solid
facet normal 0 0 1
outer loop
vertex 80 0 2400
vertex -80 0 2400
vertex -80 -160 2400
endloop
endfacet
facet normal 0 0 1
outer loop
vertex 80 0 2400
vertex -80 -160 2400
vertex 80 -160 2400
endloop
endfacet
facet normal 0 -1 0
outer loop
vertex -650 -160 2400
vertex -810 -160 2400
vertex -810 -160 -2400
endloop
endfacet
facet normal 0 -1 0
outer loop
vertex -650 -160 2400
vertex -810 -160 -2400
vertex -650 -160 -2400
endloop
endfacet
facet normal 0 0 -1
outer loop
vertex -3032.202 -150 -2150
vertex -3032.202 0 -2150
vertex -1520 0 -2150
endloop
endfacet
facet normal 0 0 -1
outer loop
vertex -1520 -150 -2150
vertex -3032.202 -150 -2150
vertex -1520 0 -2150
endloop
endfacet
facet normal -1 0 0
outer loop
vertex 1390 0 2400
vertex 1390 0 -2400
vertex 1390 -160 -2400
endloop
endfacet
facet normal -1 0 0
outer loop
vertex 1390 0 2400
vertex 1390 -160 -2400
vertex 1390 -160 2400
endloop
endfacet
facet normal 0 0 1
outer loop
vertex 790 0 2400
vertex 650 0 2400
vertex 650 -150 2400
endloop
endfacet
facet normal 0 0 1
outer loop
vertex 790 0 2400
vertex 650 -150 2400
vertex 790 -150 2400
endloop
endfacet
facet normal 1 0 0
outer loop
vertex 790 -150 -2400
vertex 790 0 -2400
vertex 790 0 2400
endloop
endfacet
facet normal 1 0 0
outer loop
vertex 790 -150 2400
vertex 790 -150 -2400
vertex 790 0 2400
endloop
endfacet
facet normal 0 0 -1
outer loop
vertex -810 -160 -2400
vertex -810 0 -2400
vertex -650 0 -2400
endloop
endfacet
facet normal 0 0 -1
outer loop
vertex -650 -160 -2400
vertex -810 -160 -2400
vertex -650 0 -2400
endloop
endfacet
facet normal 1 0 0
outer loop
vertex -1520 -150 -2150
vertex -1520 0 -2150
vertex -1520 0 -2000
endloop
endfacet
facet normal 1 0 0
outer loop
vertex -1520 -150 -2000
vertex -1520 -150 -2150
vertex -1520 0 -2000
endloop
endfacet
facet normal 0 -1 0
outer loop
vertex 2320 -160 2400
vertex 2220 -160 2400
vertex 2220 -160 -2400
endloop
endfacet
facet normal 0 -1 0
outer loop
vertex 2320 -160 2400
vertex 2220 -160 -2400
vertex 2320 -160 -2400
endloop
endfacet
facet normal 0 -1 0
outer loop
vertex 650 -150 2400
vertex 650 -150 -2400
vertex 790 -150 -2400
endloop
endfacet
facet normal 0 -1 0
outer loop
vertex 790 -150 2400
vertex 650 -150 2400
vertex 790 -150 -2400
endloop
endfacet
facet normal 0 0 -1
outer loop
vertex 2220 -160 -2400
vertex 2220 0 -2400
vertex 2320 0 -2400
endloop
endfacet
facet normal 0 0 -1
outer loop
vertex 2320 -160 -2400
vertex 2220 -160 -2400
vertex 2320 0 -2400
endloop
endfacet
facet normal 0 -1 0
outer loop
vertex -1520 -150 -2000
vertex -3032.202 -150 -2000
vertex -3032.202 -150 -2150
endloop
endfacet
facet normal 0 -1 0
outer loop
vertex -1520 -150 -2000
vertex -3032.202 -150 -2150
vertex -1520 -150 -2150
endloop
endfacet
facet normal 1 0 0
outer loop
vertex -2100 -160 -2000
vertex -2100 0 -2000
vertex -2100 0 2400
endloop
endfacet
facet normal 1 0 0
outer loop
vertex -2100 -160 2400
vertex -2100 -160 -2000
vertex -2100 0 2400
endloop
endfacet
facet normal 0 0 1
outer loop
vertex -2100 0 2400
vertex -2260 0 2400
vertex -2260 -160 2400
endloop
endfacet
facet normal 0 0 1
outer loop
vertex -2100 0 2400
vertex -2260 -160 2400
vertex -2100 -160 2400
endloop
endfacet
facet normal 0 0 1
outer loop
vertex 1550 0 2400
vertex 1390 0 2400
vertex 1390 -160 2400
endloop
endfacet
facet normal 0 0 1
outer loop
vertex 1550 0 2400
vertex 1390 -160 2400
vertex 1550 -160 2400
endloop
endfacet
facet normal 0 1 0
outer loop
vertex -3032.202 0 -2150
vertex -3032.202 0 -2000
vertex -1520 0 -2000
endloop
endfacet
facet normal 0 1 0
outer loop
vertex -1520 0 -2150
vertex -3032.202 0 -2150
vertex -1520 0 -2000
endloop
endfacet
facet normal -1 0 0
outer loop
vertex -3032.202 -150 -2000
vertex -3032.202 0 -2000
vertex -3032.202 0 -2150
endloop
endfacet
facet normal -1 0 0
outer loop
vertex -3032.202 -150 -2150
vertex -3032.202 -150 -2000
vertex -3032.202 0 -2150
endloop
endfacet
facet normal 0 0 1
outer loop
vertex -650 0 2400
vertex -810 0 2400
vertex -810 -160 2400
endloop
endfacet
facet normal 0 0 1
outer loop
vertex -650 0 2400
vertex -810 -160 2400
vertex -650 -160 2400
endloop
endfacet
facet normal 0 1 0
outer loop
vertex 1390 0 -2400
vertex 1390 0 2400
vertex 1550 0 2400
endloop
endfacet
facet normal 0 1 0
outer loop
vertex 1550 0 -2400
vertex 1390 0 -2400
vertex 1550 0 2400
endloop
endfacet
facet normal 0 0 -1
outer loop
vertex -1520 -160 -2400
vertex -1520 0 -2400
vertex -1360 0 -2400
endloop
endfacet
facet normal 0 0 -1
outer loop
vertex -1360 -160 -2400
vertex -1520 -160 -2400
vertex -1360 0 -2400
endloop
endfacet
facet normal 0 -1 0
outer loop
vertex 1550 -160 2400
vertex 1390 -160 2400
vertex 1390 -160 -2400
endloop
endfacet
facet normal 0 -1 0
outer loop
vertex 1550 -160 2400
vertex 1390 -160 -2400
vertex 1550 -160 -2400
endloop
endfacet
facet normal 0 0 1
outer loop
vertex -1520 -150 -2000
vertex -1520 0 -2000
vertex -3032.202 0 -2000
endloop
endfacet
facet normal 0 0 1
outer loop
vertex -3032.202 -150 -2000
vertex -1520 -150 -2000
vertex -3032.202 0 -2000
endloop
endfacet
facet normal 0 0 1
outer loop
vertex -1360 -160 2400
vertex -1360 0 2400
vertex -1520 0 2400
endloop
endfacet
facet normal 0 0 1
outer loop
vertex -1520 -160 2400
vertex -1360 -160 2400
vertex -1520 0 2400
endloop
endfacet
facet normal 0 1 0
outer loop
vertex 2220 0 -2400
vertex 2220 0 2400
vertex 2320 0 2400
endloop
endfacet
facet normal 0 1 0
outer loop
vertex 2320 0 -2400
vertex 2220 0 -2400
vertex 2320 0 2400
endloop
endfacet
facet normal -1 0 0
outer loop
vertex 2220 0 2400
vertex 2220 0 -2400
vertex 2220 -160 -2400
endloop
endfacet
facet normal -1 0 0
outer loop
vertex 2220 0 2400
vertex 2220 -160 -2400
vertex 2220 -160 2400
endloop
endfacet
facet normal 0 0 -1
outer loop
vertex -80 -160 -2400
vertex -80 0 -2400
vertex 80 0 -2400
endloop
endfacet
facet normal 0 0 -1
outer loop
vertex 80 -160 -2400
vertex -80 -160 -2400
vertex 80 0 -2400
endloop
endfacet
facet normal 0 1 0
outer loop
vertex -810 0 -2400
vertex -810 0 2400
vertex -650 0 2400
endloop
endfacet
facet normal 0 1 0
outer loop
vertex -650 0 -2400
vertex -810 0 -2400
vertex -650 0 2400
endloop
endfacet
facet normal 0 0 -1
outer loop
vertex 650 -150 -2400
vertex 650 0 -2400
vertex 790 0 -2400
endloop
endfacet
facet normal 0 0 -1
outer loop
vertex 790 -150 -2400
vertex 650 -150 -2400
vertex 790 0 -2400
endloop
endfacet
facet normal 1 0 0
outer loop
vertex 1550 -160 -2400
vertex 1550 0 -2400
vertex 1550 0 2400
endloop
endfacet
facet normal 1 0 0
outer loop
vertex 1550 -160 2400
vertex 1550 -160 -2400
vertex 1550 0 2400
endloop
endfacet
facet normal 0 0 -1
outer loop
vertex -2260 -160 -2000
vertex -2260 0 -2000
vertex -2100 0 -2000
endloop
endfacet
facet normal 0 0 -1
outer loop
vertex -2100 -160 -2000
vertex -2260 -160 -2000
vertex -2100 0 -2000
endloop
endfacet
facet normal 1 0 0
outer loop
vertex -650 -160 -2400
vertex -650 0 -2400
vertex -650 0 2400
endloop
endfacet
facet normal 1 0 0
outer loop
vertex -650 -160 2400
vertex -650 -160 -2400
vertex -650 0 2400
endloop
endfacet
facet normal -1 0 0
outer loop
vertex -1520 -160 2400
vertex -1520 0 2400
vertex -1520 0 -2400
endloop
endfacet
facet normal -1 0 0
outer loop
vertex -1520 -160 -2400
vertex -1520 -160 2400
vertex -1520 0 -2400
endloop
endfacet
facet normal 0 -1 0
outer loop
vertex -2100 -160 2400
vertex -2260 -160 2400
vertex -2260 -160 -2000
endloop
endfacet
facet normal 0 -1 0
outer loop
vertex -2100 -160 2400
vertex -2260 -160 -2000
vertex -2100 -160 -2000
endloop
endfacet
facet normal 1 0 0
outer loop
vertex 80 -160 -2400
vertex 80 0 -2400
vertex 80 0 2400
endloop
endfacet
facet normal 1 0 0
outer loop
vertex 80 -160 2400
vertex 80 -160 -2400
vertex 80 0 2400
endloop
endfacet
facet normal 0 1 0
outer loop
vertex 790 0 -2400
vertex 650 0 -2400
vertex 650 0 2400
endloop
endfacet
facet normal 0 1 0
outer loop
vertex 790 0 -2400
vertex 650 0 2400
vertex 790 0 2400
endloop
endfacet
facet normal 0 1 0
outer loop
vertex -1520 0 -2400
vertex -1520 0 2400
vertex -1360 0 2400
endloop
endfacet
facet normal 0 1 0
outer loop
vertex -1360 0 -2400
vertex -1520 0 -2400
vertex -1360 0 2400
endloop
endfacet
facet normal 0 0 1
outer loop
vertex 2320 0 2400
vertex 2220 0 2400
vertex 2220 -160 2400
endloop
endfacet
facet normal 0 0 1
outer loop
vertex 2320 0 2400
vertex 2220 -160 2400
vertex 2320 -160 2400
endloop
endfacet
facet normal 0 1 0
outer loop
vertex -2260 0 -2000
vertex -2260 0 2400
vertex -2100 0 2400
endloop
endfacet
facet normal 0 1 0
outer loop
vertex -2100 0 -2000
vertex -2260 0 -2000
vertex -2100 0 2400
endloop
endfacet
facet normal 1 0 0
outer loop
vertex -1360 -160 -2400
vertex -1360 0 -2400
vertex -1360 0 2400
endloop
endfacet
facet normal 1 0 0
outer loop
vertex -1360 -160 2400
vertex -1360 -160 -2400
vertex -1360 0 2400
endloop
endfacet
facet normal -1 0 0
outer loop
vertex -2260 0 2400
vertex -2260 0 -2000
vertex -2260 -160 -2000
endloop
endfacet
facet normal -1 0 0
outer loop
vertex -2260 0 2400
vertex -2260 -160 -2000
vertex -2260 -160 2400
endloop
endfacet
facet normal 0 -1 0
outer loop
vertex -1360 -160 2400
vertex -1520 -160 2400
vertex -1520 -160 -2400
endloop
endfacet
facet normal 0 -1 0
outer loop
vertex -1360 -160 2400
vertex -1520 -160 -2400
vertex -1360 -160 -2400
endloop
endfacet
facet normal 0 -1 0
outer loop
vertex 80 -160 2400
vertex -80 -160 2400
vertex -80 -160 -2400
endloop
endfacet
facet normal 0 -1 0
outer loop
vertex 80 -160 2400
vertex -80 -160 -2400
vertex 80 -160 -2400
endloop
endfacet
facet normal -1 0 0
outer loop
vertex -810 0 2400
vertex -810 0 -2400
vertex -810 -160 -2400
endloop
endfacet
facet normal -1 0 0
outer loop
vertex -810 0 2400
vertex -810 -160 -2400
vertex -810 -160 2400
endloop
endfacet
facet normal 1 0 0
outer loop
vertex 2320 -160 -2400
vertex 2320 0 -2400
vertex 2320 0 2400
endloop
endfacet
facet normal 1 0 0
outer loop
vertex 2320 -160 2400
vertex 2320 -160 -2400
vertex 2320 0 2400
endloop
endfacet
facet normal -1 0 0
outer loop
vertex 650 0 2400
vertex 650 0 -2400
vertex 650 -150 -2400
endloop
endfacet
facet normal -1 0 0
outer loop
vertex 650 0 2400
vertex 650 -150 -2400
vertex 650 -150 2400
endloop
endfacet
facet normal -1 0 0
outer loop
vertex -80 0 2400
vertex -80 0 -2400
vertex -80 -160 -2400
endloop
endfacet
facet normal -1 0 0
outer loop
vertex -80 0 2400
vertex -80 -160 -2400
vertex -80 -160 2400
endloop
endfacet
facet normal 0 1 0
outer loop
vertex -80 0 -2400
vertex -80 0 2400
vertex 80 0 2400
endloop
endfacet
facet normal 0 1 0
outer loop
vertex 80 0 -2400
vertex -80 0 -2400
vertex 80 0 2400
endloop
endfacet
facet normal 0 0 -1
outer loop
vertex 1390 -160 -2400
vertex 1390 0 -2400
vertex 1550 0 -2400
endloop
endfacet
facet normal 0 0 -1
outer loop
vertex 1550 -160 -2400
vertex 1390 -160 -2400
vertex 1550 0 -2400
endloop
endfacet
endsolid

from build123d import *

# Parameters (mm, degrees)
F0_W     = 100
F0_H     = 4800
F0_W_2   = 160
F0_H_2   = 4400
F1_DEPTH = 160
F0_W_3   = 140
F2_DEPTH = 150


with BuildPart() as f1:
    # F0 (on Front) → F1 (new body)
    with BuildSketch(Plane.XZ):
        with Locations((2270, 0)):
            Rectangle(F0_W, F0_H)
        with Locations((1470, 0)):
            Rectangle(F0_W_2, F0_H)
        Rectangle(F0_W_2, F0_H)
        with Locations((-730, 0)):
            Rectangle(F0_W_2, F0_H)
        Polygon((-1360, -2400), (-1360, 2400), (-1520, 2400), (-1520, -2000), (-1520, -2150), (-1520, -2400), align=None)
        with Locations((-2180, 200)):
            Rectangle(F0_W_2, F0_H_2)
    extrude(amount=F1_DEPTH)


with BuildPart() as f2:
    # F0 (on Front) → F2 (new body)
    with BuildSketch(Plane.XZ):
        Polygon((-1520, -2150), (-1520, -2000), (-2100, -2000), (-2260, -2000), (-3032.201767, -2000), (-3032.201767, -2150), align=None)
        with Locations((720, 0)):
            Rectangle(F0_W_3, F0_H)
    extrude(amount=F2_DEPTH)


solid = Compound([f1.part, f2.part])
